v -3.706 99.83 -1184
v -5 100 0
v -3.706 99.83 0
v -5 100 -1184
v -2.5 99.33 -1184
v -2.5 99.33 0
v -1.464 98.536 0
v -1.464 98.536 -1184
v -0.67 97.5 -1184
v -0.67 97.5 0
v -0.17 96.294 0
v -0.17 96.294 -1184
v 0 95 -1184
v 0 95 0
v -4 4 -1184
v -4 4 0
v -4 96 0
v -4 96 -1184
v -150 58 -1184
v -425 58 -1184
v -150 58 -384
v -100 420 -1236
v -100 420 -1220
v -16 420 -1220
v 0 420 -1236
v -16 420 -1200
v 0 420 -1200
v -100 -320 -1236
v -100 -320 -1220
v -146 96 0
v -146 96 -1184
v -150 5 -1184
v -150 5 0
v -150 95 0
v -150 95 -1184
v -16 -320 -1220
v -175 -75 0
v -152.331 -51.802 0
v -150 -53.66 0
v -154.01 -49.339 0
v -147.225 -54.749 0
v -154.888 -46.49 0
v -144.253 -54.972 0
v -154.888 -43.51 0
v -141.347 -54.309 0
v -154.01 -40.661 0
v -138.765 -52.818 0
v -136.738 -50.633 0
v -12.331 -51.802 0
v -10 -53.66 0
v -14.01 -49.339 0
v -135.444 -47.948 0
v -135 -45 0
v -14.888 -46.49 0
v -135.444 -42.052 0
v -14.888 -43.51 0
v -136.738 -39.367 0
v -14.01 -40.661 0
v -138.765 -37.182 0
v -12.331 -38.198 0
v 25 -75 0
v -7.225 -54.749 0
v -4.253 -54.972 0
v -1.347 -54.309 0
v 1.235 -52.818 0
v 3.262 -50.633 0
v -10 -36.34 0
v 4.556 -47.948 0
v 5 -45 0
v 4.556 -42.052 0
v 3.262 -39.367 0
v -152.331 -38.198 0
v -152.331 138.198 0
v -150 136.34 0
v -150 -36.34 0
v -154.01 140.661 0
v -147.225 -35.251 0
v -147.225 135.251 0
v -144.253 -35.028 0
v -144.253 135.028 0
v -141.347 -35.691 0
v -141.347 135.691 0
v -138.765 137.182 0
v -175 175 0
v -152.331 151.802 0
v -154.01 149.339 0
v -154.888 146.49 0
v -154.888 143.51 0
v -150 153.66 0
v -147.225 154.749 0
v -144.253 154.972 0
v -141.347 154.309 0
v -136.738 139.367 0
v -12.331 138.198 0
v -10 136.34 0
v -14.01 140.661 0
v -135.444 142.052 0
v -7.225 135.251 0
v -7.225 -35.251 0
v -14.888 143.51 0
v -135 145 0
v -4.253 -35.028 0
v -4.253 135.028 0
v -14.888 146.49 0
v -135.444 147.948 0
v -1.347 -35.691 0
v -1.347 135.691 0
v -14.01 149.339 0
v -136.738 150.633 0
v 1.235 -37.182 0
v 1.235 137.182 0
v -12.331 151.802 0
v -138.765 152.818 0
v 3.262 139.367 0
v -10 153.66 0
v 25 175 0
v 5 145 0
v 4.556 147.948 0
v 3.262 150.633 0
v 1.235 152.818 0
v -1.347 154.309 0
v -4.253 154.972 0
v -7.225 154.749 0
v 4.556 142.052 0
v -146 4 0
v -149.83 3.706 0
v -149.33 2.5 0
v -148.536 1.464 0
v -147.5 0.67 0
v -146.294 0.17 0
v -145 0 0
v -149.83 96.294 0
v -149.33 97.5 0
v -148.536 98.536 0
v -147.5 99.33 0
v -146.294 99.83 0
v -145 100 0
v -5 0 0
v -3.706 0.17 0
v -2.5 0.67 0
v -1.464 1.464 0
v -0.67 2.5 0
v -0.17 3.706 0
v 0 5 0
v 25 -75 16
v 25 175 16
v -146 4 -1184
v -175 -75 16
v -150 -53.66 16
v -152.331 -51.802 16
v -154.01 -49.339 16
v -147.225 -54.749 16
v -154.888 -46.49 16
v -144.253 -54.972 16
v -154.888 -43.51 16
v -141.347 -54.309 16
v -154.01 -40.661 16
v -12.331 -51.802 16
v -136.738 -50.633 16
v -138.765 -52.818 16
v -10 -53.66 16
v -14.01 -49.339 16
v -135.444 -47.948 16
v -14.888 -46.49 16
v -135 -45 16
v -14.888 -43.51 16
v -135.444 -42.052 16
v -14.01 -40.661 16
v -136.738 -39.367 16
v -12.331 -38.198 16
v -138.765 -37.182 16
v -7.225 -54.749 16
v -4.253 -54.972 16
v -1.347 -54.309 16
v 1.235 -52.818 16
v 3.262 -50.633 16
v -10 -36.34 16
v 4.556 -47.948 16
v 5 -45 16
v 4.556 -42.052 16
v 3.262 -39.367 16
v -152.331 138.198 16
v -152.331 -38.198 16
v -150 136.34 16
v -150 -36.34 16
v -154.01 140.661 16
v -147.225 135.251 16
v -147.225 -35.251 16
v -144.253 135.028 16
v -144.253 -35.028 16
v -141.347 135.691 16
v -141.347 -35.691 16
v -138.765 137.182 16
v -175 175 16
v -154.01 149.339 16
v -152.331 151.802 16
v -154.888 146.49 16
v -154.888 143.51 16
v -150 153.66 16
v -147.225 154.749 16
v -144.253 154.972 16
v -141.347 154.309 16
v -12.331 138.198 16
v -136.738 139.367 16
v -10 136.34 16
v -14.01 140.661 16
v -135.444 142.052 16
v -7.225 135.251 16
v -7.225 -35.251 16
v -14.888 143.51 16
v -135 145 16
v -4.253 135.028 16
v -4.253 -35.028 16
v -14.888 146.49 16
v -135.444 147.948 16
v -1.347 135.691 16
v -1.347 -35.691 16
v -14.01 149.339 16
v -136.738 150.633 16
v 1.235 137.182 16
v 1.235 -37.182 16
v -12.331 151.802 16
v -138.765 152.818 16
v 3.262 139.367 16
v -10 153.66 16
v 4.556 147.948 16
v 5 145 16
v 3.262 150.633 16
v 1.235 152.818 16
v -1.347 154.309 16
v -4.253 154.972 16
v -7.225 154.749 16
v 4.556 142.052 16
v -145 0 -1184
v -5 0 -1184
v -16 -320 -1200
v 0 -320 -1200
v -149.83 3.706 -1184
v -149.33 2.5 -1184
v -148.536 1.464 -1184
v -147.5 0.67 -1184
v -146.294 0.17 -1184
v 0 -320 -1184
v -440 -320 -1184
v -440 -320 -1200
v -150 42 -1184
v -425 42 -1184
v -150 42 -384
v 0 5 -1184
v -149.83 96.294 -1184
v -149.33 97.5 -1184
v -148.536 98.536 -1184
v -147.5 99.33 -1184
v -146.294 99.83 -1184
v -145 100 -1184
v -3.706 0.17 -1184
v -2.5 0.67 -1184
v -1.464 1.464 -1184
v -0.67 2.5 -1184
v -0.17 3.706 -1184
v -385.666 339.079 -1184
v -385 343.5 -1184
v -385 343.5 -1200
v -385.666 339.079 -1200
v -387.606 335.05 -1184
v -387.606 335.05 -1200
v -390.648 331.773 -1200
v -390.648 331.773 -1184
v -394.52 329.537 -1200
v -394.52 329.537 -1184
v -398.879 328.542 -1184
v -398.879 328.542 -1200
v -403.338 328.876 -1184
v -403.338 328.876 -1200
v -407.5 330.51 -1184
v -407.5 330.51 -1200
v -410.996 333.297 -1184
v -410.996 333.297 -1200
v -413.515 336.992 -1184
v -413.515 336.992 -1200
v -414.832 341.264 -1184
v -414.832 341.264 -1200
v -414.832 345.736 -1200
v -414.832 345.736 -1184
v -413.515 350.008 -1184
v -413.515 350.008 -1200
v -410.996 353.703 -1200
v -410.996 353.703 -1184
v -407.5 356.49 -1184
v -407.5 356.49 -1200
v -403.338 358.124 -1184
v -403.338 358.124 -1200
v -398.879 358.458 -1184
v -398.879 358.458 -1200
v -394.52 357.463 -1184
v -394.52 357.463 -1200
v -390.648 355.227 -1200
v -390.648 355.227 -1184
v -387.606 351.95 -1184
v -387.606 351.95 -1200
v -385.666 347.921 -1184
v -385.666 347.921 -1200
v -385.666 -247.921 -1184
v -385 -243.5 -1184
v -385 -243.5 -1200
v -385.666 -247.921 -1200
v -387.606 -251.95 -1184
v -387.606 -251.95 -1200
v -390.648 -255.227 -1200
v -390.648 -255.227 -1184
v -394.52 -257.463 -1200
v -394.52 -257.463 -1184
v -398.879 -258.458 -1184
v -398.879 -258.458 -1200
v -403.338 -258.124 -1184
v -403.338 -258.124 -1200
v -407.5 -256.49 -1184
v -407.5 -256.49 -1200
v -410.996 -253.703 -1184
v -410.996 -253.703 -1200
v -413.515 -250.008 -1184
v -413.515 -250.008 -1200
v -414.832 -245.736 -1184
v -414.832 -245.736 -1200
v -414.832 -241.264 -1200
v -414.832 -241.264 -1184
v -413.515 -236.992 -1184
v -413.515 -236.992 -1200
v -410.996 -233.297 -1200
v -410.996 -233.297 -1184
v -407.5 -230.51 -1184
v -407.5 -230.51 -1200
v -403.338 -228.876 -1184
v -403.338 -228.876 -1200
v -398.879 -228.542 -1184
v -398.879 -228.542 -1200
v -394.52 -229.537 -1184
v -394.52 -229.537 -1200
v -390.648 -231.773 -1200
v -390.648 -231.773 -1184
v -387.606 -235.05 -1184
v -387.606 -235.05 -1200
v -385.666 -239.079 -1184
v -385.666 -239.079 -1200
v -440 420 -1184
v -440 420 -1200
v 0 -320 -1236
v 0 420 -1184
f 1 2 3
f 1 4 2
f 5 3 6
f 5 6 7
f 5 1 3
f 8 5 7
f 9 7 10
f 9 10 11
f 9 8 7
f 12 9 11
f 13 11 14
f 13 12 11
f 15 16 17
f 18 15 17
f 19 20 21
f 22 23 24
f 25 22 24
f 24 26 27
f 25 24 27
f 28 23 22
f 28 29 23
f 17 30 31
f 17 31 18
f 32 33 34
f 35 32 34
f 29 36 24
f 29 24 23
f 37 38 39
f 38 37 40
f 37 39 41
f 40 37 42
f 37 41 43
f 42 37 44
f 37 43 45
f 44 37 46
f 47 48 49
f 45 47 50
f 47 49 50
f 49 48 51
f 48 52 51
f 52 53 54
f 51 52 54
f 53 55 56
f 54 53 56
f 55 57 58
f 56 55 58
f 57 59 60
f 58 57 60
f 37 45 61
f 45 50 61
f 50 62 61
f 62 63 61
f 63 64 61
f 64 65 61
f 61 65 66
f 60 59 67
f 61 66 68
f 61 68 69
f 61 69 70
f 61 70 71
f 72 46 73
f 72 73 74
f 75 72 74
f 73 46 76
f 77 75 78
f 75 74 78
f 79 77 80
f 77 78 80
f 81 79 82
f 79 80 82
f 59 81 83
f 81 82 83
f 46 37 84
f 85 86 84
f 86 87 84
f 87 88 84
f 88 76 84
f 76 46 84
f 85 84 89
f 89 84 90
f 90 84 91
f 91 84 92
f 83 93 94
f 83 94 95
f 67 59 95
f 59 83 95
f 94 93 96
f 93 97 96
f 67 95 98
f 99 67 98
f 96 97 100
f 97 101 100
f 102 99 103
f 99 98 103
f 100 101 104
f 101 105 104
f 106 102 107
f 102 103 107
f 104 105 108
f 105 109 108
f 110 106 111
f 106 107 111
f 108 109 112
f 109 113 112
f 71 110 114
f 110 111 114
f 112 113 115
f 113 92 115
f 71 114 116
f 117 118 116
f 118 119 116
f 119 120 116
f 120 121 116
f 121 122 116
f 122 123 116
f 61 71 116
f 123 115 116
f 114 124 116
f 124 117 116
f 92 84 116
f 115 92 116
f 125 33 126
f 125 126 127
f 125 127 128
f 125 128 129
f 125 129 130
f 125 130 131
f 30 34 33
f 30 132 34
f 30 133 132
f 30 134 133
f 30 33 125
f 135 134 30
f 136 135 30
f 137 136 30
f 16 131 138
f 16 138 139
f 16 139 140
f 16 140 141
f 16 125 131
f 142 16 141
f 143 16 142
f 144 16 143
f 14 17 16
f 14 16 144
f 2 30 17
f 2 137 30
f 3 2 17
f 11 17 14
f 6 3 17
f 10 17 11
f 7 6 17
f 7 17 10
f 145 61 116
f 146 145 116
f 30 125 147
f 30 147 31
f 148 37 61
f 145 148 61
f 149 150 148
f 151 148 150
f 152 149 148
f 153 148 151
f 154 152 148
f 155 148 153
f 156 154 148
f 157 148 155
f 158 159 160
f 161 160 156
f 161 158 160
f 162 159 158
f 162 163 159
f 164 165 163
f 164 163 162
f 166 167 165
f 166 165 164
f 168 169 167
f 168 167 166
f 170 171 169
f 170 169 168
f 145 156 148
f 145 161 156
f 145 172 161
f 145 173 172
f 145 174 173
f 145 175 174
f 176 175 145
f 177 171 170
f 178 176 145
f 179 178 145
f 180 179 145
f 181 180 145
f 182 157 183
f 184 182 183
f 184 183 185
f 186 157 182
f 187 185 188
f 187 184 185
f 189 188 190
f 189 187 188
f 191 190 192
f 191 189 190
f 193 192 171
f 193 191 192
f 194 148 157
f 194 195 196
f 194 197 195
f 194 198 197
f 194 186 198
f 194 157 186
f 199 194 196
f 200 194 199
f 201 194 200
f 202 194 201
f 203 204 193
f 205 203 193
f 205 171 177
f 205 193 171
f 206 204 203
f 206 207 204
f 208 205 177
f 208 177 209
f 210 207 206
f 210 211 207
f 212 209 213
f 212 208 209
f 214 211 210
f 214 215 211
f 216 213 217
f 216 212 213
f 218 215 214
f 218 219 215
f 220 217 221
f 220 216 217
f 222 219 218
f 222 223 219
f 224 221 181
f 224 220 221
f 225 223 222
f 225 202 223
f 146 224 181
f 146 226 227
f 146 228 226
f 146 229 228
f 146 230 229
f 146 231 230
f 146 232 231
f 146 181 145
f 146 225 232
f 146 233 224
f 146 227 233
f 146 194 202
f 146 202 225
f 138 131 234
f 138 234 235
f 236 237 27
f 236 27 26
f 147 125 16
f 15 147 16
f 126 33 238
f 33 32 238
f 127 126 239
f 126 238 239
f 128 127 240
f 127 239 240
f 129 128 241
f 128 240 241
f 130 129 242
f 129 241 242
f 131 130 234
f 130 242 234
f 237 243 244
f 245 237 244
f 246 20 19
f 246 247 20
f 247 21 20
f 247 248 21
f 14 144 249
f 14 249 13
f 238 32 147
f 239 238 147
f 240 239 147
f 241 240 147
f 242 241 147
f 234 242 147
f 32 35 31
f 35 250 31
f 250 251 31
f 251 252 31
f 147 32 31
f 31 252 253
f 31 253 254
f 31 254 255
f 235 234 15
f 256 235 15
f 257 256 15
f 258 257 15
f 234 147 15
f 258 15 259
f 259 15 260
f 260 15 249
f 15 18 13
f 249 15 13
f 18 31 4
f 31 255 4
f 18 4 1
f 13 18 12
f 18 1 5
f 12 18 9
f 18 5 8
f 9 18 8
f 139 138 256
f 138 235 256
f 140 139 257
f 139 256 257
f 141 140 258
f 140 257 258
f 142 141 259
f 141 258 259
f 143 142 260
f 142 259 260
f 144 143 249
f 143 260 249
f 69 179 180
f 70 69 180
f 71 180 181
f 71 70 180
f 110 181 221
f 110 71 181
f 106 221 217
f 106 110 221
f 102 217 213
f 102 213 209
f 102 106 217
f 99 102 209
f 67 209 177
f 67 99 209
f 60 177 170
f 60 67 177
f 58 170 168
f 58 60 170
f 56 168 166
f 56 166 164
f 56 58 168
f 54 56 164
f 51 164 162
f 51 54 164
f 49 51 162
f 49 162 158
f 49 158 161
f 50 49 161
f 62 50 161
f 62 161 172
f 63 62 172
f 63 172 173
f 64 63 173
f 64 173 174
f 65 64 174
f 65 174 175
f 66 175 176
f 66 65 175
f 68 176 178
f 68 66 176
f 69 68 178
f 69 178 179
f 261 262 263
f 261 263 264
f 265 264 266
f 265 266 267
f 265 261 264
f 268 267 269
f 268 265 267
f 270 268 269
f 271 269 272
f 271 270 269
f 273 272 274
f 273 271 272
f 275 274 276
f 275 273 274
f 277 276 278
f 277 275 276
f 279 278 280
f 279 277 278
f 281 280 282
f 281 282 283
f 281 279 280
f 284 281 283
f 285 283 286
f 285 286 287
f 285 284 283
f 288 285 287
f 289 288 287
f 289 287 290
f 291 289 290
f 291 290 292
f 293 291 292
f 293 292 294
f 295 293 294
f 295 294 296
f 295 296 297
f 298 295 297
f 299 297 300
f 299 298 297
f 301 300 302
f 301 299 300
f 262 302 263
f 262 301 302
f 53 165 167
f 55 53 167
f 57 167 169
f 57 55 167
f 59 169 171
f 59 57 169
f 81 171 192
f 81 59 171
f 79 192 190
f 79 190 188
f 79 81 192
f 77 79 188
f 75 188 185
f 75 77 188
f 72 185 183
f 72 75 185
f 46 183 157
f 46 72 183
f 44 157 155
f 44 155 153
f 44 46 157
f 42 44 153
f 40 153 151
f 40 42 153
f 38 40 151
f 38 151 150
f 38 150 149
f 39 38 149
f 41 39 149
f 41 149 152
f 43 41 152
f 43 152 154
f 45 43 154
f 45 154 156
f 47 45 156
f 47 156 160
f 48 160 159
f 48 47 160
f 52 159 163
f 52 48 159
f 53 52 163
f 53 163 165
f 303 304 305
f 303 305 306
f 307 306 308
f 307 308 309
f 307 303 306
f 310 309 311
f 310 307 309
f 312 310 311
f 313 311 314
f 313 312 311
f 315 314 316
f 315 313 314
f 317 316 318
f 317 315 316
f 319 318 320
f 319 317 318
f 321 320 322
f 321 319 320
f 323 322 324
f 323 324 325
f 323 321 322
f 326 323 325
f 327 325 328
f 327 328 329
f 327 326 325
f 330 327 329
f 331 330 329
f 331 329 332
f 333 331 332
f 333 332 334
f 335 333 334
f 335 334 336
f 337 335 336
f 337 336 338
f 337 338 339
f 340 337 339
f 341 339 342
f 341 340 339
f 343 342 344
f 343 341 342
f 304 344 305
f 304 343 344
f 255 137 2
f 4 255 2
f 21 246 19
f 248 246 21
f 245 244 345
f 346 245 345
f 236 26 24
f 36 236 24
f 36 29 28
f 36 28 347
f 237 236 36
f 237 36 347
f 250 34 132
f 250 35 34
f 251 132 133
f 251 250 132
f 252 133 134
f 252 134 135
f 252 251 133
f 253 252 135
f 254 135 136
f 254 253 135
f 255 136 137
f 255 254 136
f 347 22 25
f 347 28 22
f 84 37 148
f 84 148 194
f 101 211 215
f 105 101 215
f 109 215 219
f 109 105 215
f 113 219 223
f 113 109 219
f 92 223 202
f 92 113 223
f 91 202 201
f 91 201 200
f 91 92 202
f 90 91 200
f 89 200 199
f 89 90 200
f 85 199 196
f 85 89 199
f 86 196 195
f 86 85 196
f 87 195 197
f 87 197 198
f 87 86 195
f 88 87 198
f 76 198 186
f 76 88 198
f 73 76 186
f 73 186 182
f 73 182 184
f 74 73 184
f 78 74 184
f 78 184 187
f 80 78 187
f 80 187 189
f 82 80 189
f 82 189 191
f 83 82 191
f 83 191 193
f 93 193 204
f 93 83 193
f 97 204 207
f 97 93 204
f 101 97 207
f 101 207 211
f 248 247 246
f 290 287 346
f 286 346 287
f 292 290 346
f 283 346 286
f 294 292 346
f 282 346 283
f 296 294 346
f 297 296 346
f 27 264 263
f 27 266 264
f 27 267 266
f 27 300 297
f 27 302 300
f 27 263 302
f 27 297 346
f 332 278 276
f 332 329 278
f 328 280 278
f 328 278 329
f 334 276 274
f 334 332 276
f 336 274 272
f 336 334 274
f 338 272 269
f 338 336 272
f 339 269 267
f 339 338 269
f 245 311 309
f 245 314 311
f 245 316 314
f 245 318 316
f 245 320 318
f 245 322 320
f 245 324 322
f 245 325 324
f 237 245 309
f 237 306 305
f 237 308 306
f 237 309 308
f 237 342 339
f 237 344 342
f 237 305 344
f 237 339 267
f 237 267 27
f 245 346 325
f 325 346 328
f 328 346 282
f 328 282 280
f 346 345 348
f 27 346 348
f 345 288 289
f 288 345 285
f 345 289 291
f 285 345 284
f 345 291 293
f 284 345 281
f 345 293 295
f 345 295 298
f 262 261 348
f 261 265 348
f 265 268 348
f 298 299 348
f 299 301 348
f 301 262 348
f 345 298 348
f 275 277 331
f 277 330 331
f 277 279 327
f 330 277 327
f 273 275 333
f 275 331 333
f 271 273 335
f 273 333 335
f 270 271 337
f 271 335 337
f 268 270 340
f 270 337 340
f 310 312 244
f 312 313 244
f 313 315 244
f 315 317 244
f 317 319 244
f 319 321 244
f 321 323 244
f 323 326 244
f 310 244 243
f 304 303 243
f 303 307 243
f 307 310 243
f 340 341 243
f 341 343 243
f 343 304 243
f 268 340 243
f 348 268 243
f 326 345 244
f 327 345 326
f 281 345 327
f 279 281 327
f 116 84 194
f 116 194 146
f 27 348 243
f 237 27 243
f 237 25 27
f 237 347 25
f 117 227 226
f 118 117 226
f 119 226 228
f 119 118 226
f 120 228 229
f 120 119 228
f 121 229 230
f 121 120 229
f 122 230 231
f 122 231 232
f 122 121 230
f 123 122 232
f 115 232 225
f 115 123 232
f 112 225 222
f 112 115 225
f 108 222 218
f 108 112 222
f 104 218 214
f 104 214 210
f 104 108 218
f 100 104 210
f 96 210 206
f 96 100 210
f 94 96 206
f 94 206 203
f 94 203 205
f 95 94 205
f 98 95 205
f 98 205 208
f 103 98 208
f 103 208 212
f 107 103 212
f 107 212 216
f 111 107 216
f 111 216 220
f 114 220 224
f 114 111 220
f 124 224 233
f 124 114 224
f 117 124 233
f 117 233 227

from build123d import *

# Parameters (mm, degrees)
F0_W      = 150
F0_H      = 100
F0_W_2    = 142
F0_H_2    = 92
F1_DEPTH  = 1184
F2_R      = 15
F2_W      = 150
F2_H      = 100
F2_W_2    = 142
F2_H_2    = 92
F3_DEPTH  = 16
F6_DEPTH  = 8
F8_DEPTH  = 370
F9_W      = 200
F9_H      = 250
F9_R      = 10
F9_W_2    = 150
F9_H_2    = 100
F9_W_3    = 142
F9_H_3    = 92
F10_DEPTH = 16
F11_R     = 5


with BuildPart() as f1:
    # F0 (on Top) → F1 (new body)
    with BuildSketch(Plane.XY):
        with Locations((-75, 50)):
            Rectangle(F0_W, F0_H)
        with Locations((-75, 50)):
            Rectangle(F0_W_2, F0_H_2, mode=Mode.SUBTRACT)
    extrude(amount=-F1_DEPTH)

    # F11
    f11_edges = [f1.edges().sort_by_distance(p)[0] for p in [
        (0, 0, -592),
        (-150, 0, -592),
        (-150, 100, -592),
        (0, 100, -592),
    ]]
    fillet(f11_edges, radius=F11_R)


with BuildPart() as f3:
    # F2 (on face) → F3 (new body)
    with BuildSketch(Plane(origin=(0, 0, -1184), x_dir=(1, 0, 0), z_dir=(0, 0, -1))):
        Polygon((-150, 0), (0, 0), (0, 320), (-440, 320), (-440, -420), (0, -420), (0, -100), (-150, -100), align=None)
        with Locations((-400, -343.5)):
            Circle(F2_R, mode=Mode.SUBTRACT)
        with Locations((-400, 243.5)):
            Circle(F2_R, mode=Mode.SUBTRACT)
        with Locations((-75, -50)):
            Rectangle(F2_W, F2_H)
        with Locations((-75, -50)):
            Rectangle(F2_W_2, F2_H_2, mode=Mode.SUBTRACT)
        with Locations((-75, -50)):
            Rectangle(F2_W_2, F2_H_2)
    extrude(amount=F3_DEPTH)


with BuildPart() as f6:
    # F5 (on offset) → F6 (new body, symmetric)
    with BuildSketch(Plane.XZ.offset(-50)):
        Polygon((-425, -1184), (-150, -1184), (-150, -384), align=None)
    extrude(amount=F6_DEPTH, both=True)


with BuildPart() as f8:
    # F7 (on offset) → F8 (new body, symmetric)
    with BuildSketch(Plane.XZ.offset(-50)):
        Polygon((0, -1236), (0, -1200), (-16, -1200), (-16, -1220), (-100, -1220), (-100, -1236), align=None)
    extrude(amount=F8_DEPTH, both=True)


with BuildPart() as f10:
    # F9 (on face) → F10 (new body)
    with BuildSketch(Plane.XY):
        with Locations((-75, 50)):
            Rectangle(F9_W, F9_H)
        with Locations((-145, -45)):
            Circle(F9_R, mode=Mode.SUBTRACT)
        with Locations((-5, -45)):
            Circle(F9_R, mode=Mode.SUBTRACT)
        with Locations((-145, 145)):
            Circle(F9_R, mode=Mode.SUBTRACT)
        with Locations((-75, 50)):
            Rectangle(F9_W_2, F9_H_2, mode=Mode.SUBTRACT)
        with Locations((-5, 145)):
            Circle(F9_R, mode=Mode.SUBTRACT)
        with Locations((-75, 50)):
            Rectangle(F9_W_2, F9_H_2)
        with Locations((-75, 50)):
            Rectangle(F9_W_3, F9_H_3, mode=Mode.SUBTRACT)
        with Locations((-75, 50)):
            Rectangle(F9_W_3, F9_H_3)
    extrude(amount=F10_DEPTH)


solid = Compound([f1.part, f3.part, f6.part, f8.part, f10.part])
